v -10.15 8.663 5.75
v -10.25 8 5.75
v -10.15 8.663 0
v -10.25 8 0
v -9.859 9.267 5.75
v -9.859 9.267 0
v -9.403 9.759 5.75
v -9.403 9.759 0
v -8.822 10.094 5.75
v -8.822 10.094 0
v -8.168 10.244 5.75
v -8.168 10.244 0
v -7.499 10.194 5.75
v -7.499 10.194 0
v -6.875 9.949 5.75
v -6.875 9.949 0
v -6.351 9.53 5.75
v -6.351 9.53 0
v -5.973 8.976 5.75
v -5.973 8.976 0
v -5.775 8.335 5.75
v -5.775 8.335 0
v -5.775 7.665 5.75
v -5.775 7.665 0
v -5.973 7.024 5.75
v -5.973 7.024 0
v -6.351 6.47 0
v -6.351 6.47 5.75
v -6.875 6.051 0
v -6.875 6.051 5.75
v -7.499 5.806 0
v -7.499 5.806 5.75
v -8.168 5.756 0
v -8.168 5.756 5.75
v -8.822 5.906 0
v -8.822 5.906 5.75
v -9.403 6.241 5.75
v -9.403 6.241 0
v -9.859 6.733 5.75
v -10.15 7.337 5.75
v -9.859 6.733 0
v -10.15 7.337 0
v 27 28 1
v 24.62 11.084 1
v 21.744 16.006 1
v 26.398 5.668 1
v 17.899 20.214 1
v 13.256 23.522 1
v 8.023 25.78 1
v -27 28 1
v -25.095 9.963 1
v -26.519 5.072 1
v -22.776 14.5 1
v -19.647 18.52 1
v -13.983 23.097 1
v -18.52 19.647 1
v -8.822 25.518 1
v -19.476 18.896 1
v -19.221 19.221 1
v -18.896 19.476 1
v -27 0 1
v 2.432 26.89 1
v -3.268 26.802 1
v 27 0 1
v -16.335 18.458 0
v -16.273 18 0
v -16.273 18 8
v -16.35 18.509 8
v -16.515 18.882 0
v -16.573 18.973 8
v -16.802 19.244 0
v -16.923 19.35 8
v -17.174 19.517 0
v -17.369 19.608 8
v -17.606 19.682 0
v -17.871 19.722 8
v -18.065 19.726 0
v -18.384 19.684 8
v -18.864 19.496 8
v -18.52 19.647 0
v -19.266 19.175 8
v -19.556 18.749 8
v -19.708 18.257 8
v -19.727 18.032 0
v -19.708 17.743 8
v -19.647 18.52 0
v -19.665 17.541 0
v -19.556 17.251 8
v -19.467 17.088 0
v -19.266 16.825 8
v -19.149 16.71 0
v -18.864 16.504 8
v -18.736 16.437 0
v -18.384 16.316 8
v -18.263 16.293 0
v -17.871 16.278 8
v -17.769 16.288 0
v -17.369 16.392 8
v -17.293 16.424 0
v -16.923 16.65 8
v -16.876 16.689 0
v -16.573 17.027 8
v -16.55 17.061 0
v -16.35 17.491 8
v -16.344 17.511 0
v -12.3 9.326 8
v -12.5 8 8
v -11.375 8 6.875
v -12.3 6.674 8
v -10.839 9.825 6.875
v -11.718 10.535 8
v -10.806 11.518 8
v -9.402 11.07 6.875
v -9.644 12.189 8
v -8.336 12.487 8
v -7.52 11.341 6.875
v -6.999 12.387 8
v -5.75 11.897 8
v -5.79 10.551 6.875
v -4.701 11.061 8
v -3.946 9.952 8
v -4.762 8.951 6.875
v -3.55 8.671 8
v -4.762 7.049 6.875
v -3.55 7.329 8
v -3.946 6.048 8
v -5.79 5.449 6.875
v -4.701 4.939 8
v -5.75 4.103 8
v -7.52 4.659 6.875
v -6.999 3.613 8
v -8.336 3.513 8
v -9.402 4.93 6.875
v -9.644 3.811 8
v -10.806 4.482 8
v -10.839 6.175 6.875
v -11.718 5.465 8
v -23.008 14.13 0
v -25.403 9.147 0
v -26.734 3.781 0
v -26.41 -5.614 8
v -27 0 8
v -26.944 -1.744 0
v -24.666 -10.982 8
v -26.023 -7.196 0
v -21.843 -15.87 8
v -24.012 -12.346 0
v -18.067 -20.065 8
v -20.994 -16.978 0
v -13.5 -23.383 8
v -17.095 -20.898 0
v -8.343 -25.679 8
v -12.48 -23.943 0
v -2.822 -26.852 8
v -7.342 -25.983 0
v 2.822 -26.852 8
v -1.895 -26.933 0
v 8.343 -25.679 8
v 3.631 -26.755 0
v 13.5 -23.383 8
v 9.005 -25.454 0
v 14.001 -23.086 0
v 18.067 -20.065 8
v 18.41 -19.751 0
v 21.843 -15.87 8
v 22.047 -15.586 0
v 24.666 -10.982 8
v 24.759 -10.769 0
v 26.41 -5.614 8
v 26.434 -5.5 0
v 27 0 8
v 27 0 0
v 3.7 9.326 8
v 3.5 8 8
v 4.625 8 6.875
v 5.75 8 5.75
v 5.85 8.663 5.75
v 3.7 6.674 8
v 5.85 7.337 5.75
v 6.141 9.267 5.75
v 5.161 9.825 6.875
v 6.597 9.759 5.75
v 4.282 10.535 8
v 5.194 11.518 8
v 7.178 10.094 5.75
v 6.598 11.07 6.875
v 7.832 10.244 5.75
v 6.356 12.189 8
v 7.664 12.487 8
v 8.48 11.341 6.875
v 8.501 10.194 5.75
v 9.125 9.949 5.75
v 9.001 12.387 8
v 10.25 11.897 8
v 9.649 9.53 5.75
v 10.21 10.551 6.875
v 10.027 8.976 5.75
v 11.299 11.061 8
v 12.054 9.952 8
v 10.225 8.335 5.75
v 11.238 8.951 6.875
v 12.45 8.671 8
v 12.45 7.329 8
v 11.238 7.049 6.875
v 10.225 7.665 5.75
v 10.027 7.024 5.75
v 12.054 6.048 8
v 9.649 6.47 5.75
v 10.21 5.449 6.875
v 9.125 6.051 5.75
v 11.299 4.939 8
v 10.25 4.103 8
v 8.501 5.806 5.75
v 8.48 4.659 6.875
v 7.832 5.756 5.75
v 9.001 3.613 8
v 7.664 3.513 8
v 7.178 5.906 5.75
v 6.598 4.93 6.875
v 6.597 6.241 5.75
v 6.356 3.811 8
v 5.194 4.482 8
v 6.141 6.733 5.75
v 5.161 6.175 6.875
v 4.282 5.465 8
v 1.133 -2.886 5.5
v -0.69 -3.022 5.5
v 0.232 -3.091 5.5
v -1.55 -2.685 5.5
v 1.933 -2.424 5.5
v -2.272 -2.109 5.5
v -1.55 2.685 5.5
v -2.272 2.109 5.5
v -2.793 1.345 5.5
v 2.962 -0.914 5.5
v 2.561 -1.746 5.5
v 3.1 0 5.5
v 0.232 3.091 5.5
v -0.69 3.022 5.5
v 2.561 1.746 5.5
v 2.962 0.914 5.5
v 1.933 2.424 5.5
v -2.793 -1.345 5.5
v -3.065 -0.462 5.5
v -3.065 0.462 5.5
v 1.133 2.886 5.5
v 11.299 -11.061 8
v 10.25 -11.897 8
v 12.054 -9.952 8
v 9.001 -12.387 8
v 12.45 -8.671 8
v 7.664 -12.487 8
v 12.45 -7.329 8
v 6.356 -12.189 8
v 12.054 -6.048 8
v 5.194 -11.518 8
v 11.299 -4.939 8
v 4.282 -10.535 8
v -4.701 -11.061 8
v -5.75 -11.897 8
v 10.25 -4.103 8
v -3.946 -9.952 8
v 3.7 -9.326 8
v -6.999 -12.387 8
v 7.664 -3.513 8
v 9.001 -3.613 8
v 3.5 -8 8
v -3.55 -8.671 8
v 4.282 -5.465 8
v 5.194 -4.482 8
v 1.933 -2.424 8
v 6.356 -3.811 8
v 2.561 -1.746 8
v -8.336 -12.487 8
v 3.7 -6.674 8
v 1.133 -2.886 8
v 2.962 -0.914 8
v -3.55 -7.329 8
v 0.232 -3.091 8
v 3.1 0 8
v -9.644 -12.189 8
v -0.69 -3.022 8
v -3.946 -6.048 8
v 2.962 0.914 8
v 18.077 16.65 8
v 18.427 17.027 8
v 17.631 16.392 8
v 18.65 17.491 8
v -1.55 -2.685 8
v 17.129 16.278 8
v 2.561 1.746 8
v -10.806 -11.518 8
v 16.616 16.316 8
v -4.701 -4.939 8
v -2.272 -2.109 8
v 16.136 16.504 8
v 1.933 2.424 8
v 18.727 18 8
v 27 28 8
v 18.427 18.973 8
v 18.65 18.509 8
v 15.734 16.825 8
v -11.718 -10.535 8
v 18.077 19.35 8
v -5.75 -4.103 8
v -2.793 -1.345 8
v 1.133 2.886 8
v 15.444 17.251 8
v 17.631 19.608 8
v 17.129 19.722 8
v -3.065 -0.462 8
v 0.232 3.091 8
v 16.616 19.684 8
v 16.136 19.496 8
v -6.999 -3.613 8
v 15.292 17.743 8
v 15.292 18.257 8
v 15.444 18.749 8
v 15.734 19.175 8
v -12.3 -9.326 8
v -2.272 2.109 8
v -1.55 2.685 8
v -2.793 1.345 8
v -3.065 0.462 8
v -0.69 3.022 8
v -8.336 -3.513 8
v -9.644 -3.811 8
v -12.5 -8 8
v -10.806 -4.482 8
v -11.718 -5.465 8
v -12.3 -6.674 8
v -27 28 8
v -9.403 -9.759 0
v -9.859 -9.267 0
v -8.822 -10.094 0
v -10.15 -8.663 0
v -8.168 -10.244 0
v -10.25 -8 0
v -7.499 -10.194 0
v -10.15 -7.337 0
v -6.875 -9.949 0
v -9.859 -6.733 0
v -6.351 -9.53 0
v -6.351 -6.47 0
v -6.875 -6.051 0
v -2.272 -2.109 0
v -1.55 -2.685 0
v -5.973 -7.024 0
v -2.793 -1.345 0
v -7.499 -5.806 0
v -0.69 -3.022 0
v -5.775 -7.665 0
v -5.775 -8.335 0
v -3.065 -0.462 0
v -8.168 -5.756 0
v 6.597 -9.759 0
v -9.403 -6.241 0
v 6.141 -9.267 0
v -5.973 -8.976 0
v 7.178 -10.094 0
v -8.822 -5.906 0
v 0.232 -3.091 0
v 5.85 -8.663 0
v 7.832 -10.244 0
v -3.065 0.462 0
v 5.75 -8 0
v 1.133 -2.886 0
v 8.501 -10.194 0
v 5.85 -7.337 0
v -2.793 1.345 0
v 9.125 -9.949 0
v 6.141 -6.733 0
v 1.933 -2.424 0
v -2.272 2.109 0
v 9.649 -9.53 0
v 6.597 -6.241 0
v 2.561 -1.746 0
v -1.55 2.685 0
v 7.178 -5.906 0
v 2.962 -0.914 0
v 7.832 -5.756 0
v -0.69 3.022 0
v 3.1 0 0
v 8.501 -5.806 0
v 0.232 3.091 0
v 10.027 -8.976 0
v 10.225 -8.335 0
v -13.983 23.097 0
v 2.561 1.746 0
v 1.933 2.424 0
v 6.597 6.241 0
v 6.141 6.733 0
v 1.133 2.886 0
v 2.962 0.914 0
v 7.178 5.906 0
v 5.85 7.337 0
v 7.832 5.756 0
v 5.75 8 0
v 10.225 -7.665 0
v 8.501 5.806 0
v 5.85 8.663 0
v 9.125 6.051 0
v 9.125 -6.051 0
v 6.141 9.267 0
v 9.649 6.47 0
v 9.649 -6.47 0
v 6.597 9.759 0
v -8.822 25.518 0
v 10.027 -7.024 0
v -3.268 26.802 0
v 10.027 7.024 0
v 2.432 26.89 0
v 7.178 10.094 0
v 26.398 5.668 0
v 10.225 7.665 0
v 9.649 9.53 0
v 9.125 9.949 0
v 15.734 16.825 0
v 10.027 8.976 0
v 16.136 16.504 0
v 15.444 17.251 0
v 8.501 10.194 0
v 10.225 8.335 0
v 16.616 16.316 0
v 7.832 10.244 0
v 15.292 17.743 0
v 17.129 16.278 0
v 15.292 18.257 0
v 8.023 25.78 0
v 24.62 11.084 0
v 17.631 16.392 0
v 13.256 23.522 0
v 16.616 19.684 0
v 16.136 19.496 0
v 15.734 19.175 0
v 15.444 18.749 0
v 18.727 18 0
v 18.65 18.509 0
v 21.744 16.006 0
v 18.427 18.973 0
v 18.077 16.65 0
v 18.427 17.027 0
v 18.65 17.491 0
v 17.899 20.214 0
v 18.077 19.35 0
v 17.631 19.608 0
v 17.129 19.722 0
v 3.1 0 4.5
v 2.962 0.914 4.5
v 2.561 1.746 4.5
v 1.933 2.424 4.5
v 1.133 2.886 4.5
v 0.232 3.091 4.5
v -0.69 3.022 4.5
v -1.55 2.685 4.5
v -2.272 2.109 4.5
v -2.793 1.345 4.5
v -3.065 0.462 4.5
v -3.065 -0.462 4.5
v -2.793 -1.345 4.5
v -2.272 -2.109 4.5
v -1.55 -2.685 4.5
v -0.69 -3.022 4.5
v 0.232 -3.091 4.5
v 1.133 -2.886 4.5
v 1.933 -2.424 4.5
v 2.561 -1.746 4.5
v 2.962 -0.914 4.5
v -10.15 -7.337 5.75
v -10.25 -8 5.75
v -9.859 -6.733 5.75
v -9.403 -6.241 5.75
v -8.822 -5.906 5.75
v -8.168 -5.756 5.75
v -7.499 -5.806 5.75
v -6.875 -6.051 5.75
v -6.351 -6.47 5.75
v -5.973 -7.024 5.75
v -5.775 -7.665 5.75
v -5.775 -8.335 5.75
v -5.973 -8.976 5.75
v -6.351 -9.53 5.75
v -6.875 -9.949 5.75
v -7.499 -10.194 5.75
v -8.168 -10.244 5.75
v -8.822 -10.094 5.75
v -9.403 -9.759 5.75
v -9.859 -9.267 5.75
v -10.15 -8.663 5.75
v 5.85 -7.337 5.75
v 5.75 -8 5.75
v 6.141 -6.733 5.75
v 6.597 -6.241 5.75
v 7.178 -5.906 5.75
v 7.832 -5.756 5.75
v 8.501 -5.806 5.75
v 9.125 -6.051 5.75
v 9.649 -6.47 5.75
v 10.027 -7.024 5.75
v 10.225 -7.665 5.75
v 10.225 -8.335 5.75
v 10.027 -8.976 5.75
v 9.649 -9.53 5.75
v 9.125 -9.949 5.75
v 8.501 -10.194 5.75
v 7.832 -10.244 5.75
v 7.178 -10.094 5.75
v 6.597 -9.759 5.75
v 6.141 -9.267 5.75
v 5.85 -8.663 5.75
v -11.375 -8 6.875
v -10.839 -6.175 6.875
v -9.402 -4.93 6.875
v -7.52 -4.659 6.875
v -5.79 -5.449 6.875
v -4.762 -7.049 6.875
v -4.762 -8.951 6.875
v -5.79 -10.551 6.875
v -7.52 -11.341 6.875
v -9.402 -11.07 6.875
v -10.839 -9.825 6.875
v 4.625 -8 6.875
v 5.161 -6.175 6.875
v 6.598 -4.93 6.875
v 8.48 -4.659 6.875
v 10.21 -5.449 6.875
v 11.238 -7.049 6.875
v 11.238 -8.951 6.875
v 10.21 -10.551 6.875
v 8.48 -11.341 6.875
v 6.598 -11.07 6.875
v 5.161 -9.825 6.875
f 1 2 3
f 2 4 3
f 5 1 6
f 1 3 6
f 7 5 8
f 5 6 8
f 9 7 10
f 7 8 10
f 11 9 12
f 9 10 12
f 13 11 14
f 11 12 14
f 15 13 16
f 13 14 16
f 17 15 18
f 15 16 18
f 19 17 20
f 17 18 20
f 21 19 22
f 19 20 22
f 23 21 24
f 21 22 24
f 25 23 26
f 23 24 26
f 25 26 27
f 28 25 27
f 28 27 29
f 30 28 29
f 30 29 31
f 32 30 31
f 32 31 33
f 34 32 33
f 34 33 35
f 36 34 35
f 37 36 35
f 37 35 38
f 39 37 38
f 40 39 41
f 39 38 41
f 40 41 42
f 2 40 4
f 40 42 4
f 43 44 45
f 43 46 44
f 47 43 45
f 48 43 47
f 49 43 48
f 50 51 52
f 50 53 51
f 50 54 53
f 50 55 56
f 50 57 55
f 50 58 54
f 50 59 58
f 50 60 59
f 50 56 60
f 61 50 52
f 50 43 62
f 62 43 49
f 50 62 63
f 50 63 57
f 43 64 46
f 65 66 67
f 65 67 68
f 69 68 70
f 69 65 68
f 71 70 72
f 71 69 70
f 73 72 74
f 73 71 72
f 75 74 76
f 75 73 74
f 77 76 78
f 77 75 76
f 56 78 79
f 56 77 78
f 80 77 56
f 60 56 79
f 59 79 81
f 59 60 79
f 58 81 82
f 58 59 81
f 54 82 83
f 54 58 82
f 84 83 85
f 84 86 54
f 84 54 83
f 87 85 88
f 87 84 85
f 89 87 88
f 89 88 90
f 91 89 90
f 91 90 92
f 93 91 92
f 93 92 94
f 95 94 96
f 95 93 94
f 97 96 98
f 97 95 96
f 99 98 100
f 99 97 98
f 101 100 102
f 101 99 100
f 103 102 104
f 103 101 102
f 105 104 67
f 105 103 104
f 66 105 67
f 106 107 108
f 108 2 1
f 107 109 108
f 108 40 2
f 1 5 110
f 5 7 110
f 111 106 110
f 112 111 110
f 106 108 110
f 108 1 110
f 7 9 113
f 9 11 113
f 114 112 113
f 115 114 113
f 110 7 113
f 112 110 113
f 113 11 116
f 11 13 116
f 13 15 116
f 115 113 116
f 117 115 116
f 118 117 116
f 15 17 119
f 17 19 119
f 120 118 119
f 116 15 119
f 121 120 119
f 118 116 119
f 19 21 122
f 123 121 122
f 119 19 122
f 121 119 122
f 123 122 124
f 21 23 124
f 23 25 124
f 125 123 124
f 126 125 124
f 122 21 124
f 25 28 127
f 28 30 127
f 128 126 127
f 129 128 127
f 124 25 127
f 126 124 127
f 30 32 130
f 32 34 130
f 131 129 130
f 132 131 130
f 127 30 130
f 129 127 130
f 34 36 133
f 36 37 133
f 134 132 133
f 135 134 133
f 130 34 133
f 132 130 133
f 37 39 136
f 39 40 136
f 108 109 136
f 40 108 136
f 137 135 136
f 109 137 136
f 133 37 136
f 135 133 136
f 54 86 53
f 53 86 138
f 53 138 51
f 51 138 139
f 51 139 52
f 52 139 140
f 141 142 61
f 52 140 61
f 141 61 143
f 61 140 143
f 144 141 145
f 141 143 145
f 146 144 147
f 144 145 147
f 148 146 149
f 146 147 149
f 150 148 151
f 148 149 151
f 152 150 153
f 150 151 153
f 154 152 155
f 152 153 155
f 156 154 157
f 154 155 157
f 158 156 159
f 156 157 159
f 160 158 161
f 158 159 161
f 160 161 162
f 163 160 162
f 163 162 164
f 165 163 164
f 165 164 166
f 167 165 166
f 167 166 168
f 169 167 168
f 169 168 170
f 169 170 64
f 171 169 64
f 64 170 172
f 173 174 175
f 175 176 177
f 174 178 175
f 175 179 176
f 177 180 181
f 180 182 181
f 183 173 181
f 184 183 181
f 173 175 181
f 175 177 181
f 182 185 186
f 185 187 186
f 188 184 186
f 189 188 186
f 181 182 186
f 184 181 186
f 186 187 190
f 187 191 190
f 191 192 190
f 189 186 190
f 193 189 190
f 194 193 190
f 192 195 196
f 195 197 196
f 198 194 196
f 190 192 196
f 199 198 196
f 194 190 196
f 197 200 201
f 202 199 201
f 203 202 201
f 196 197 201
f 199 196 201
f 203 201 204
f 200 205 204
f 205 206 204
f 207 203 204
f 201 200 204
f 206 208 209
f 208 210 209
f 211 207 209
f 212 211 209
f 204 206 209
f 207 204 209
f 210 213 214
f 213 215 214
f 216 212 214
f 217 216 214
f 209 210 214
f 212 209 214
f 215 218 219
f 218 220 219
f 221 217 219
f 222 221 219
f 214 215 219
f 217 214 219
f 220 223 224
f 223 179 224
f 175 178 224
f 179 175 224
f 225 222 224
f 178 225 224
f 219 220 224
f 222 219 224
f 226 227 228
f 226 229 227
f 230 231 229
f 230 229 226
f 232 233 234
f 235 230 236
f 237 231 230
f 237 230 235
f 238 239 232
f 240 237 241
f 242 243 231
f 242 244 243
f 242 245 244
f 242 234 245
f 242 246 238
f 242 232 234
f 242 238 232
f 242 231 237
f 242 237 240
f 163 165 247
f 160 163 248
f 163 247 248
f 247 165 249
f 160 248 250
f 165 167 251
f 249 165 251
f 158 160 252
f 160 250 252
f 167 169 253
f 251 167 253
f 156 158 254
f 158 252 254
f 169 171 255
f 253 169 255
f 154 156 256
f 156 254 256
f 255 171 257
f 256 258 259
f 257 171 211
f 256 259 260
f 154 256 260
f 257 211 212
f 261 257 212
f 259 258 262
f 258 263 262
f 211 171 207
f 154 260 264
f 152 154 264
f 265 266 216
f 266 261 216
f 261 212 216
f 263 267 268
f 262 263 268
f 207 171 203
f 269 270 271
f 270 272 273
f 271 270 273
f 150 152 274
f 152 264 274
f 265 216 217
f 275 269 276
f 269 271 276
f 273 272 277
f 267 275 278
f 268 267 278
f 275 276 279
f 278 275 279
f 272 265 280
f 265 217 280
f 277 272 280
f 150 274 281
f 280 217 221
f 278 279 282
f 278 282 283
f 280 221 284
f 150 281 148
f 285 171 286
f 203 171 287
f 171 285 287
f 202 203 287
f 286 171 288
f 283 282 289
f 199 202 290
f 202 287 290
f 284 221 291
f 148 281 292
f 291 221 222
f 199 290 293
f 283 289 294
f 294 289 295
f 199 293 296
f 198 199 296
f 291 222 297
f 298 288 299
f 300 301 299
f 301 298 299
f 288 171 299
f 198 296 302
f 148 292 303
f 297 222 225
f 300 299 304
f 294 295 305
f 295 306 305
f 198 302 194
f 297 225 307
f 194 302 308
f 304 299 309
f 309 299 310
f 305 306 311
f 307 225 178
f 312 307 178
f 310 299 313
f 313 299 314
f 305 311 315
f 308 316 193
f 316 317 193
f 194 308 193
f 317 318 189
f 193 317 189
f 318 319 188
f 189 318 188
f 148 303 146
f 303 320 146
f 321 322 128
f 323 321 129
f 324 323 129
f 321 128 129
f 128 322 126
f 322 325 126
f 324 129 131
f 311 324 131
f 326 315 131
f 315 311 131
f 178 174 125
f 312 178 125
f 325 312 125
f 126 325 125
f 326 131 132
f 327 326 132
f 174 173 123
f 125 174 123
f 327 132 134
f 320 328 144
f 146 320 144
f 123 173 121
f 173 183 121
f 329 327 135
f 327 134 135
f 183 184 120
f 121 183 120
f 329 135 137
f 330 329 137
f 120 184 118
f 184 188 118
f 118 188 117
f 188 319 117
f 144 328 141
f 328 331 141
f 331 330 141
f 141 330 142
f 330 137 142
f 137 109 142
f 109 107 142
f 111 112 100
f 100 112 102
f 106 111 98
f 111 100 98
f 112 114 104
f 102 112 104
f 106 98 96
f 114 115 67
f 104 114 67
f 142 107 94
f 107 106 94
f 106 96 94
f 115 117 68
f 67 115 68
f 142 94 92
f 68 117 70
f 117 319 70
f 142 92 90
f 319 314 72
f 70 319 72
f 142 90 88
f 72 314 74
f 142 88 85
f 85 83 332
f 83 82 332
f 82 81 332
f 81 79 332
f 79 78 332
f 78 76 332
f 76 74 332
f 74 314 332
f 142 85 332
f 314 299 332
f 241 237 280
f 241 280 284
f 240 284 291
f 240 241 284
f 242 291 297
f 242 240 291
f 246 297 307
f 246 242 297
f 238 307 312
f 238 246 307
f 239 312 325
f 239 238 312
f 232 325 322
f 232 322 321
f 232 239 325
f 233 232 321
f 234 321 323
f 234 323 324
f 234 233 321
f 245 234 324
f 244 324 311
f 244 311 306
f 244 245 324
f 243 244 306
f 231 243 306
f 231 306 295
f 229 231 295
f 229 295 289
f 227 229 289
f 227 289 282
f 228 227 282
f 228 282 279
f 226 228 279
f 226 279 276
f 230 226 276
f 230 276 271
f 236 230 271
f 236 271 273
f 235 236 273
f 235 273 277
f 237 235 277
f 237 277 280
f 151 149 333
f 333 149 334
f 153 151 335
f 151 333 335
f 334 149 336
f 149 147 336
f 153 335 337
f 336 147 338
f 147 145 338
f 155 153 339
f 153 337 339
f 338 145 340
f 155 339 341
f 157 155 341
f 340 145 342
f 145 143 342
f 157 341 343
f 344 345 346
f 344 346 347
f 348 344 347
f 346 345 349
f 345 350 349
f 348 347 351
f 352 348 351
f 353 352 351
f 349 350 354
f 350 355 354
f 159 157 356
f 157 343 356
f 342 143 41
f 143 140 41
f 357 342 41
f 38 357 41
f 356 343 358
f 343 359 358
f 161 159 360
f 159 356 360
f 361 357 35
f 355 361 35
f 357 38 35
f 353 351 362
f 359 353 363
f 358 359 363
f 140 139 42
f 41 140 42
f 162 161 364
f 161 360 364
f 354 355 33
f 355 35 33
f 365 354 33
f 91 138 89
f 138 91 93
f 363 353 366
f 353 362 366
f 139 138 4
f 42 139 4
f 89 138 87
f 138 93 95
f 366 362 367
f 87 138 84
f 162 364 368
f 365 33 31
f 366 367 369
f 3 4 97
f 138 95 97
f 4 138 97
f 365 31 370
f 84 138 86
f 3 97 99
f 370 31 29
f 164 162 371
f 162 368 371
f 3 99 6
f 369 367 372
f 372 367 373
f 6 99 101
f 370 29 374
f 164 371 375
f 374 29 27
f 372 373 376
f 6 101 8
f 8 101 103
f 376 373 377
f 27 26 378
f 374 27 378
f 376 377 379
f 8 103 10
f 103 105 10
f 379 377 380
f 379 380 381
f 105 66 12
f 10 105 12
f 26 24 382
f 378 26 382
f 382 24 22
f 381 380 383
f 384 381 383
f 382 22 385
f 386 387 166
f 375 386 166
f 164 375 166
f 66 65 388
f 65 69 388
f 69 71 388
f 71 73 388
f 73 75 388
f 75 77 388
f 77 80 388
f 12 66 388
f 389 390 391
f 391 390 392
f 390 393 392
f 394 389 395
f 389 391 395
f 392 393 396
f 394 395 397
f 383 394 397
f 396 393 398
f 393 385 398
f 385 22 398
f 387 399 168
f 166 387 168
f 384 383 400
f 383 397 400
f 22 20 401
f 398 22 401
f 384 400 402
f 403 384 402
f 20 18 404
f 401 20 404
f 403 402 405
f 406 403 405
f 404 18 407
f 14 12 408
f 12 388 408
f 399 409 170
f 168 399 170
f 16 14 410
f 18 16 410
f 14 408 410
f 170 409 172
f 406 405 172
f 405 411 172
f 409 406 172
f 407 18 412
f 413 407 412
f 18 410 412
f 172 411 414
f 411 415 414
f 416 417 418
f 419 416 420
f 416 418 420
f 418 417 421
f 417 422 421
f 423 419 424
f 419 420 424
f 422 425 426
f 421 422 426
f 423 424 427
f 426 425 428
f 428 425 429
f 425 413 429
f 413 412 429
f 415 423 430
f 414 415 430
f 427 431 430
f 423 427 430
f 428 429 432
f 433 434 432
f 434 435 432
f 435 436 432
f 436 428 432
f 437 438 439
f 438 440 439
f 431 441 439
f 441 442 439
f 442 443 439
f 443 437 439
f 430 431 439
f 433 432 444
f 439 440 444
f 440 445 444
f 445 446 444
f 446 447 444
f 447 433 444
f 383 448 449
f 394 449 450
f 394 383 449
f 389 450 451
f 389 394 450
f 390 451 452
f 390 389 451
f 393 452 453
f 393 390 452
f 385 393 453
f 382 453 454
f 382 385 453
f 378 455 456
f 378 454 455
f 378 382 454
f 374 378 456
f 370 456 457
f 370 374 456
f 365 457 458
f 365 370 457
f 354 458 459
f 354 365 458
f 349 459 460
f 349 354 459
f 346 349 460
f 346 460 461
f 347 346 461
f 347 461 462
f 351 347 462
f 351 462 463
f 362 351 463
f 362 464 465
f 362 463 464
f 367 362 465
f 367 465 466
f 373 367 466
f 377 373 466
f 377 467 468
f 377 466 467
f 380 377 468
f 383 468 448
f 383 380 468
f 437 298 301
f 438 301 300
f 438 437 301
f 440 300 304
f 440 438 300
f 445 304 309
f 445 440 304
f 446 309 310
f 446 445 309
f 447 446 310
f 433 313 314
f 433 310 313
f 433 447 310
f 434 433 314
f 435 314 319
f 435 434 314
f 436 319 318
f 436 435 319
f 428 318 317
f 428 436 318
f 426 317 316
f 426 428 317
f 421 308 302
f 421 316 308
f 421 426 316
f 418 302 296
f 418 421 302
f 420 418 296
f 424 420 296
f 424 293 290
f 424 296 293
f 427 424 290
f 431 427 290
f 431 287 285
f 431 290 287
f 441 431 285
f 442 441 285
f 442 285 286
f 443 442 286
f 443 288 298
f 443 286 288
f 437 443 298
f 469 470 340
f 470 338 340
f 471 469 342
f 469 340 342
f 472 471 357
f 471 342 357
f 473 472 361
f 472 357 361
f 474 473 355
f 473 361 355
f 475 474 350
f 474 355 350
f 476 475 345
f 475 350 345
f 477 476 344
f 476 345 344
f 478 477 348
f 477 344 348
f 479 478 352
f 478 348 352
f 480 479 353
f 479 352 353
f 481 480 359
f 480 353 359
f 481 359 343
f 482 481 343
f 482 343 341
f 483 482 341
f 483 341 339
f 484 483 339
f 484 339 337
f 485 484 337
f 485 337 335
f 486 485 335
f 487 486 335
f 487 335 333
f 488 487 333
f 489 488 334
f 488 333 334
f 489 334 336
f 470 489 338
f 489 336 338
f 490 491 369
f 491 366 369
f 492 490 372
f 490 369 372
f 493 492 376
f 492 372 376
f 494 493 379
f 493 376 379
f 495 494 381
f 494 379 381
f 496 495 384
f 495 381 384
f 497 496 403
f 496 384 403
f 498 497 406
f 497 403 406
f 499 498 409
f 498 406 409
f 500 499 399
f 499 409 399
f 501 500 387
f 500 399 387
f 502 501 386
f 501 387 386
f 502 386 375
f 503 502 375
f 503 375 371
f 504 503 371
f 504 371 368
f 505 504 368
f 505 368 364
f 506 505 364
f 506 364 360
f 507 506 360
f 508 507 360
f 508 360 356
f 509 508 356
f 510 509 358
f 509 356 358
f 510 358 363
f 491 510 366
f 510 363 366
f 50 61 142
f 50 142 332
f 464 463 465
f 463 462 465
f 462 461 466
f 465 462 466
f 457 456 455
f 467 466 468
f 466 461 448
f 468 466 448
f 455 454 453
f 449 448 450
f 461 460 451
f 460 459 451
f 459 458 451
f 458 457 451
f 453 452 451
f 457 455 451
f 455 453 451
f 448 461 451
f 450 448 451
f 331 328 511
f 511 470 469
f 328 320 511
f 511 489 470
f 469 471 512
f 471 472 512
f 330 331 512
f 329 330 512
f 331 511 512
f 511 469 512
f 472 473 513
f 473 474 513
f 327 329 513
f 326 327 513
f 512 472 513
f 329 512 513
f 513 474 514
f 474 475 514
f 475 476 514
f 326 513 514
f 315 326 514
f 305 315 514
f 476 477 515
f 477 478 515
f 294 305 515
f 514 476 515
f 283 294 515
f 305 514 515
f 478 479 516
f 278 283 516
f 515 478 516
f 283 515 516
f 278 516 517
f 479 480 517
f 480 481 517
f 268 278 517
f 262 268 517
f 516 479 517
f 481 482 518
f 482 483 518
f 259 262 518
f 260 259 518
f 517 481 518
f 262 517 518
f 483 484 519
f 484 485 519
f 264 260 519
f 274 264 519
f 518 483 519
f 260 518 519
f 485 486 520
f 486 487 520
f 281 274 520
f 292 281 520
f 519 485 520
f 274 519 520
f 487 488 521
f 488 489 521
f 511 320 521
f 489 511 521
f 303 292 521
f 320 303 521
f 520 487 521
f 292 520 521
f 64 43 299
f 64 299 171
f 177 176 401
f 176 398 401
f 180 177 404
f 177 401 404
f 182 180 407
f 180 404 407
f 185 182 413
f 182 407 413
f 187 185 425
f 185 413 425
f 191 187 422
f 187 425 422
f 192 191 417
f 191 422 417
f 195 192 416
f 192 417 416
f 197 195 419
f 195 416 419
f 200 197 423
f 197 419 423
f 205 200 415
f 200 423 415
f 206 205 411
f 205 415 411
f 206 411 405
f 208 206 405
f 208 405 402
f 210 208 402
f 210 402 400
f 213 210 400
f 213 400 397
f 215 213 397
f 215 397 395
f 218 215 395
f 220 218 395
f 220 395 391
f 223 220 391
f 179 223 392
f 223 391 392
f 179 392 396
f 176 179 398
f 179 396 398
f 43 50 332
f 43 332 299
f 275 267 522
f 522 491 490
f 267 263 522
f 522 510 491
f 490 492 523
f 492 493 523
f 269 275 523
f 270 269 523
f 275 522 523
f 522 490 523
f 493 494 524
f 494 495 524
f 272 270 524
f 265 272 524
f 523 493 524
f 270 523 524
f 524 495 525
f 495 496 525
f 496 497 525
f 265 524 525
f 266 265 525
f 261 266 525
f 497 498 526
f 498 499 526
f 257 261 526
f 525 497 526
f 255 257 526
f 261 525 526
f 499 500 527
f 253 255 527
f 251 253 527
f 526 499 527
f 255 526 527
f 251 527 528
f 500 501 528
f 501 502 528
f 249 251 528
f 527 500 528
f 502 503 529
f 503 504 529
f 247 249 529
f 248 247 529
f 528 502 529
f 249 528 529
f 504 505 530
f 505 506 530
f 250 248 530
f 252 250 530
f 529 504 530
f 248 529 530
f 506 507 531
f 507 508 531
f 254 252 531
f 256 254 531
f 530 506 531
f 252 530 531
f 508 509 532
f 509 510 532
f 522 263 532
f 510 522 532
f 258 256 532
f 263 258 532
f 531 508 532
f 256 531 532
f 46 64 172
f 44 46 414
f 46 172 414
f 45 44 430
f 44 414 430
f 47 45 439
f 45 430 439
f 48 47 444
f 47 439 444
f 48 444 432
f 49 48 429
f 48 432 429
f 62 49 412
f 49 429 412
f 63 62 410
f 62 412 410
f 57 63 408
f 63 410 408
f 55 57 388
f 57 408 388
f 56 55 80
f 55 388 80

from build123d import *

# Parameters (mm, degrees)
SKETCH083_R         = 27
SKETCH083_R_2       = 3.1
PAD050_DEPTH        = 8
HOLE003_D           = 4.5
HOLE003_CSINK_D     = 9
HOLE003_CSINK_ANGLE = 90
SKETCH080_R         = 4
PAD051_DEPTH        = 1
PAD052_DEPTH        = 7
SKETCH081_R         = 1.7272
POCKET026_DEPTH     = 8.001


with BuildPart() as part:
    # Sketch083 → Pad050 (new body)
    with BuildSketch(Plane.XY):
        Circle(SKETCH083_R)
        Circle(SKETCH083_R_2, mode=Mode.SUBTRACT)
    extrude(amount=PAD050_DEPTH)

    # Hole003 (through all)
    with Locations(Plane.XY.offset(8)):
        with Locations((-8, 8), (8, 8), (8, -8), (-8, -8)):
            CounterSinkHole(HOLE003_D / 2, HOLE003_CSINK_D / 2, counter_sink_angle=HOLE003_CSINK_ANGLE)

    # Sketch080 → Pad051 (join)
    with BuildSketch(Plane.XY.offset(4.5)):
        Circle(SKETCH080_R)
    extrude(amount=PAD051_DEPTH)

    # Sketch085 → Pad052 (join)
    with BuildSketch(Plane.XY.offset(1)):
        with BuildLine():
            Line((-27, 0), (-27, 28))
            Line((-27, 28), (27, 28))
            Line((27, 28), (27, 0))
            Line((27, 0), (25, 0))
            ThreePointArc((25, 0), (0, 25), (-25, 0))
            Line((-25, 0), (-27, 0))
        make_face()
    extrude(amount=PAD052_DEPTH)

    # Sketch081 → Pocket026 (cut, through all)
    with BuildSketch(Plane.XY):
        with Locations((-18, 18)):
            Circle(SKETCH081_R)
        with Locations((17, 18)):
            Circle(SKETCH081_R)
    extrude(amount=POCKET026_DEPTH, mode=Mode.SUBTRACT)


solid = part.part
